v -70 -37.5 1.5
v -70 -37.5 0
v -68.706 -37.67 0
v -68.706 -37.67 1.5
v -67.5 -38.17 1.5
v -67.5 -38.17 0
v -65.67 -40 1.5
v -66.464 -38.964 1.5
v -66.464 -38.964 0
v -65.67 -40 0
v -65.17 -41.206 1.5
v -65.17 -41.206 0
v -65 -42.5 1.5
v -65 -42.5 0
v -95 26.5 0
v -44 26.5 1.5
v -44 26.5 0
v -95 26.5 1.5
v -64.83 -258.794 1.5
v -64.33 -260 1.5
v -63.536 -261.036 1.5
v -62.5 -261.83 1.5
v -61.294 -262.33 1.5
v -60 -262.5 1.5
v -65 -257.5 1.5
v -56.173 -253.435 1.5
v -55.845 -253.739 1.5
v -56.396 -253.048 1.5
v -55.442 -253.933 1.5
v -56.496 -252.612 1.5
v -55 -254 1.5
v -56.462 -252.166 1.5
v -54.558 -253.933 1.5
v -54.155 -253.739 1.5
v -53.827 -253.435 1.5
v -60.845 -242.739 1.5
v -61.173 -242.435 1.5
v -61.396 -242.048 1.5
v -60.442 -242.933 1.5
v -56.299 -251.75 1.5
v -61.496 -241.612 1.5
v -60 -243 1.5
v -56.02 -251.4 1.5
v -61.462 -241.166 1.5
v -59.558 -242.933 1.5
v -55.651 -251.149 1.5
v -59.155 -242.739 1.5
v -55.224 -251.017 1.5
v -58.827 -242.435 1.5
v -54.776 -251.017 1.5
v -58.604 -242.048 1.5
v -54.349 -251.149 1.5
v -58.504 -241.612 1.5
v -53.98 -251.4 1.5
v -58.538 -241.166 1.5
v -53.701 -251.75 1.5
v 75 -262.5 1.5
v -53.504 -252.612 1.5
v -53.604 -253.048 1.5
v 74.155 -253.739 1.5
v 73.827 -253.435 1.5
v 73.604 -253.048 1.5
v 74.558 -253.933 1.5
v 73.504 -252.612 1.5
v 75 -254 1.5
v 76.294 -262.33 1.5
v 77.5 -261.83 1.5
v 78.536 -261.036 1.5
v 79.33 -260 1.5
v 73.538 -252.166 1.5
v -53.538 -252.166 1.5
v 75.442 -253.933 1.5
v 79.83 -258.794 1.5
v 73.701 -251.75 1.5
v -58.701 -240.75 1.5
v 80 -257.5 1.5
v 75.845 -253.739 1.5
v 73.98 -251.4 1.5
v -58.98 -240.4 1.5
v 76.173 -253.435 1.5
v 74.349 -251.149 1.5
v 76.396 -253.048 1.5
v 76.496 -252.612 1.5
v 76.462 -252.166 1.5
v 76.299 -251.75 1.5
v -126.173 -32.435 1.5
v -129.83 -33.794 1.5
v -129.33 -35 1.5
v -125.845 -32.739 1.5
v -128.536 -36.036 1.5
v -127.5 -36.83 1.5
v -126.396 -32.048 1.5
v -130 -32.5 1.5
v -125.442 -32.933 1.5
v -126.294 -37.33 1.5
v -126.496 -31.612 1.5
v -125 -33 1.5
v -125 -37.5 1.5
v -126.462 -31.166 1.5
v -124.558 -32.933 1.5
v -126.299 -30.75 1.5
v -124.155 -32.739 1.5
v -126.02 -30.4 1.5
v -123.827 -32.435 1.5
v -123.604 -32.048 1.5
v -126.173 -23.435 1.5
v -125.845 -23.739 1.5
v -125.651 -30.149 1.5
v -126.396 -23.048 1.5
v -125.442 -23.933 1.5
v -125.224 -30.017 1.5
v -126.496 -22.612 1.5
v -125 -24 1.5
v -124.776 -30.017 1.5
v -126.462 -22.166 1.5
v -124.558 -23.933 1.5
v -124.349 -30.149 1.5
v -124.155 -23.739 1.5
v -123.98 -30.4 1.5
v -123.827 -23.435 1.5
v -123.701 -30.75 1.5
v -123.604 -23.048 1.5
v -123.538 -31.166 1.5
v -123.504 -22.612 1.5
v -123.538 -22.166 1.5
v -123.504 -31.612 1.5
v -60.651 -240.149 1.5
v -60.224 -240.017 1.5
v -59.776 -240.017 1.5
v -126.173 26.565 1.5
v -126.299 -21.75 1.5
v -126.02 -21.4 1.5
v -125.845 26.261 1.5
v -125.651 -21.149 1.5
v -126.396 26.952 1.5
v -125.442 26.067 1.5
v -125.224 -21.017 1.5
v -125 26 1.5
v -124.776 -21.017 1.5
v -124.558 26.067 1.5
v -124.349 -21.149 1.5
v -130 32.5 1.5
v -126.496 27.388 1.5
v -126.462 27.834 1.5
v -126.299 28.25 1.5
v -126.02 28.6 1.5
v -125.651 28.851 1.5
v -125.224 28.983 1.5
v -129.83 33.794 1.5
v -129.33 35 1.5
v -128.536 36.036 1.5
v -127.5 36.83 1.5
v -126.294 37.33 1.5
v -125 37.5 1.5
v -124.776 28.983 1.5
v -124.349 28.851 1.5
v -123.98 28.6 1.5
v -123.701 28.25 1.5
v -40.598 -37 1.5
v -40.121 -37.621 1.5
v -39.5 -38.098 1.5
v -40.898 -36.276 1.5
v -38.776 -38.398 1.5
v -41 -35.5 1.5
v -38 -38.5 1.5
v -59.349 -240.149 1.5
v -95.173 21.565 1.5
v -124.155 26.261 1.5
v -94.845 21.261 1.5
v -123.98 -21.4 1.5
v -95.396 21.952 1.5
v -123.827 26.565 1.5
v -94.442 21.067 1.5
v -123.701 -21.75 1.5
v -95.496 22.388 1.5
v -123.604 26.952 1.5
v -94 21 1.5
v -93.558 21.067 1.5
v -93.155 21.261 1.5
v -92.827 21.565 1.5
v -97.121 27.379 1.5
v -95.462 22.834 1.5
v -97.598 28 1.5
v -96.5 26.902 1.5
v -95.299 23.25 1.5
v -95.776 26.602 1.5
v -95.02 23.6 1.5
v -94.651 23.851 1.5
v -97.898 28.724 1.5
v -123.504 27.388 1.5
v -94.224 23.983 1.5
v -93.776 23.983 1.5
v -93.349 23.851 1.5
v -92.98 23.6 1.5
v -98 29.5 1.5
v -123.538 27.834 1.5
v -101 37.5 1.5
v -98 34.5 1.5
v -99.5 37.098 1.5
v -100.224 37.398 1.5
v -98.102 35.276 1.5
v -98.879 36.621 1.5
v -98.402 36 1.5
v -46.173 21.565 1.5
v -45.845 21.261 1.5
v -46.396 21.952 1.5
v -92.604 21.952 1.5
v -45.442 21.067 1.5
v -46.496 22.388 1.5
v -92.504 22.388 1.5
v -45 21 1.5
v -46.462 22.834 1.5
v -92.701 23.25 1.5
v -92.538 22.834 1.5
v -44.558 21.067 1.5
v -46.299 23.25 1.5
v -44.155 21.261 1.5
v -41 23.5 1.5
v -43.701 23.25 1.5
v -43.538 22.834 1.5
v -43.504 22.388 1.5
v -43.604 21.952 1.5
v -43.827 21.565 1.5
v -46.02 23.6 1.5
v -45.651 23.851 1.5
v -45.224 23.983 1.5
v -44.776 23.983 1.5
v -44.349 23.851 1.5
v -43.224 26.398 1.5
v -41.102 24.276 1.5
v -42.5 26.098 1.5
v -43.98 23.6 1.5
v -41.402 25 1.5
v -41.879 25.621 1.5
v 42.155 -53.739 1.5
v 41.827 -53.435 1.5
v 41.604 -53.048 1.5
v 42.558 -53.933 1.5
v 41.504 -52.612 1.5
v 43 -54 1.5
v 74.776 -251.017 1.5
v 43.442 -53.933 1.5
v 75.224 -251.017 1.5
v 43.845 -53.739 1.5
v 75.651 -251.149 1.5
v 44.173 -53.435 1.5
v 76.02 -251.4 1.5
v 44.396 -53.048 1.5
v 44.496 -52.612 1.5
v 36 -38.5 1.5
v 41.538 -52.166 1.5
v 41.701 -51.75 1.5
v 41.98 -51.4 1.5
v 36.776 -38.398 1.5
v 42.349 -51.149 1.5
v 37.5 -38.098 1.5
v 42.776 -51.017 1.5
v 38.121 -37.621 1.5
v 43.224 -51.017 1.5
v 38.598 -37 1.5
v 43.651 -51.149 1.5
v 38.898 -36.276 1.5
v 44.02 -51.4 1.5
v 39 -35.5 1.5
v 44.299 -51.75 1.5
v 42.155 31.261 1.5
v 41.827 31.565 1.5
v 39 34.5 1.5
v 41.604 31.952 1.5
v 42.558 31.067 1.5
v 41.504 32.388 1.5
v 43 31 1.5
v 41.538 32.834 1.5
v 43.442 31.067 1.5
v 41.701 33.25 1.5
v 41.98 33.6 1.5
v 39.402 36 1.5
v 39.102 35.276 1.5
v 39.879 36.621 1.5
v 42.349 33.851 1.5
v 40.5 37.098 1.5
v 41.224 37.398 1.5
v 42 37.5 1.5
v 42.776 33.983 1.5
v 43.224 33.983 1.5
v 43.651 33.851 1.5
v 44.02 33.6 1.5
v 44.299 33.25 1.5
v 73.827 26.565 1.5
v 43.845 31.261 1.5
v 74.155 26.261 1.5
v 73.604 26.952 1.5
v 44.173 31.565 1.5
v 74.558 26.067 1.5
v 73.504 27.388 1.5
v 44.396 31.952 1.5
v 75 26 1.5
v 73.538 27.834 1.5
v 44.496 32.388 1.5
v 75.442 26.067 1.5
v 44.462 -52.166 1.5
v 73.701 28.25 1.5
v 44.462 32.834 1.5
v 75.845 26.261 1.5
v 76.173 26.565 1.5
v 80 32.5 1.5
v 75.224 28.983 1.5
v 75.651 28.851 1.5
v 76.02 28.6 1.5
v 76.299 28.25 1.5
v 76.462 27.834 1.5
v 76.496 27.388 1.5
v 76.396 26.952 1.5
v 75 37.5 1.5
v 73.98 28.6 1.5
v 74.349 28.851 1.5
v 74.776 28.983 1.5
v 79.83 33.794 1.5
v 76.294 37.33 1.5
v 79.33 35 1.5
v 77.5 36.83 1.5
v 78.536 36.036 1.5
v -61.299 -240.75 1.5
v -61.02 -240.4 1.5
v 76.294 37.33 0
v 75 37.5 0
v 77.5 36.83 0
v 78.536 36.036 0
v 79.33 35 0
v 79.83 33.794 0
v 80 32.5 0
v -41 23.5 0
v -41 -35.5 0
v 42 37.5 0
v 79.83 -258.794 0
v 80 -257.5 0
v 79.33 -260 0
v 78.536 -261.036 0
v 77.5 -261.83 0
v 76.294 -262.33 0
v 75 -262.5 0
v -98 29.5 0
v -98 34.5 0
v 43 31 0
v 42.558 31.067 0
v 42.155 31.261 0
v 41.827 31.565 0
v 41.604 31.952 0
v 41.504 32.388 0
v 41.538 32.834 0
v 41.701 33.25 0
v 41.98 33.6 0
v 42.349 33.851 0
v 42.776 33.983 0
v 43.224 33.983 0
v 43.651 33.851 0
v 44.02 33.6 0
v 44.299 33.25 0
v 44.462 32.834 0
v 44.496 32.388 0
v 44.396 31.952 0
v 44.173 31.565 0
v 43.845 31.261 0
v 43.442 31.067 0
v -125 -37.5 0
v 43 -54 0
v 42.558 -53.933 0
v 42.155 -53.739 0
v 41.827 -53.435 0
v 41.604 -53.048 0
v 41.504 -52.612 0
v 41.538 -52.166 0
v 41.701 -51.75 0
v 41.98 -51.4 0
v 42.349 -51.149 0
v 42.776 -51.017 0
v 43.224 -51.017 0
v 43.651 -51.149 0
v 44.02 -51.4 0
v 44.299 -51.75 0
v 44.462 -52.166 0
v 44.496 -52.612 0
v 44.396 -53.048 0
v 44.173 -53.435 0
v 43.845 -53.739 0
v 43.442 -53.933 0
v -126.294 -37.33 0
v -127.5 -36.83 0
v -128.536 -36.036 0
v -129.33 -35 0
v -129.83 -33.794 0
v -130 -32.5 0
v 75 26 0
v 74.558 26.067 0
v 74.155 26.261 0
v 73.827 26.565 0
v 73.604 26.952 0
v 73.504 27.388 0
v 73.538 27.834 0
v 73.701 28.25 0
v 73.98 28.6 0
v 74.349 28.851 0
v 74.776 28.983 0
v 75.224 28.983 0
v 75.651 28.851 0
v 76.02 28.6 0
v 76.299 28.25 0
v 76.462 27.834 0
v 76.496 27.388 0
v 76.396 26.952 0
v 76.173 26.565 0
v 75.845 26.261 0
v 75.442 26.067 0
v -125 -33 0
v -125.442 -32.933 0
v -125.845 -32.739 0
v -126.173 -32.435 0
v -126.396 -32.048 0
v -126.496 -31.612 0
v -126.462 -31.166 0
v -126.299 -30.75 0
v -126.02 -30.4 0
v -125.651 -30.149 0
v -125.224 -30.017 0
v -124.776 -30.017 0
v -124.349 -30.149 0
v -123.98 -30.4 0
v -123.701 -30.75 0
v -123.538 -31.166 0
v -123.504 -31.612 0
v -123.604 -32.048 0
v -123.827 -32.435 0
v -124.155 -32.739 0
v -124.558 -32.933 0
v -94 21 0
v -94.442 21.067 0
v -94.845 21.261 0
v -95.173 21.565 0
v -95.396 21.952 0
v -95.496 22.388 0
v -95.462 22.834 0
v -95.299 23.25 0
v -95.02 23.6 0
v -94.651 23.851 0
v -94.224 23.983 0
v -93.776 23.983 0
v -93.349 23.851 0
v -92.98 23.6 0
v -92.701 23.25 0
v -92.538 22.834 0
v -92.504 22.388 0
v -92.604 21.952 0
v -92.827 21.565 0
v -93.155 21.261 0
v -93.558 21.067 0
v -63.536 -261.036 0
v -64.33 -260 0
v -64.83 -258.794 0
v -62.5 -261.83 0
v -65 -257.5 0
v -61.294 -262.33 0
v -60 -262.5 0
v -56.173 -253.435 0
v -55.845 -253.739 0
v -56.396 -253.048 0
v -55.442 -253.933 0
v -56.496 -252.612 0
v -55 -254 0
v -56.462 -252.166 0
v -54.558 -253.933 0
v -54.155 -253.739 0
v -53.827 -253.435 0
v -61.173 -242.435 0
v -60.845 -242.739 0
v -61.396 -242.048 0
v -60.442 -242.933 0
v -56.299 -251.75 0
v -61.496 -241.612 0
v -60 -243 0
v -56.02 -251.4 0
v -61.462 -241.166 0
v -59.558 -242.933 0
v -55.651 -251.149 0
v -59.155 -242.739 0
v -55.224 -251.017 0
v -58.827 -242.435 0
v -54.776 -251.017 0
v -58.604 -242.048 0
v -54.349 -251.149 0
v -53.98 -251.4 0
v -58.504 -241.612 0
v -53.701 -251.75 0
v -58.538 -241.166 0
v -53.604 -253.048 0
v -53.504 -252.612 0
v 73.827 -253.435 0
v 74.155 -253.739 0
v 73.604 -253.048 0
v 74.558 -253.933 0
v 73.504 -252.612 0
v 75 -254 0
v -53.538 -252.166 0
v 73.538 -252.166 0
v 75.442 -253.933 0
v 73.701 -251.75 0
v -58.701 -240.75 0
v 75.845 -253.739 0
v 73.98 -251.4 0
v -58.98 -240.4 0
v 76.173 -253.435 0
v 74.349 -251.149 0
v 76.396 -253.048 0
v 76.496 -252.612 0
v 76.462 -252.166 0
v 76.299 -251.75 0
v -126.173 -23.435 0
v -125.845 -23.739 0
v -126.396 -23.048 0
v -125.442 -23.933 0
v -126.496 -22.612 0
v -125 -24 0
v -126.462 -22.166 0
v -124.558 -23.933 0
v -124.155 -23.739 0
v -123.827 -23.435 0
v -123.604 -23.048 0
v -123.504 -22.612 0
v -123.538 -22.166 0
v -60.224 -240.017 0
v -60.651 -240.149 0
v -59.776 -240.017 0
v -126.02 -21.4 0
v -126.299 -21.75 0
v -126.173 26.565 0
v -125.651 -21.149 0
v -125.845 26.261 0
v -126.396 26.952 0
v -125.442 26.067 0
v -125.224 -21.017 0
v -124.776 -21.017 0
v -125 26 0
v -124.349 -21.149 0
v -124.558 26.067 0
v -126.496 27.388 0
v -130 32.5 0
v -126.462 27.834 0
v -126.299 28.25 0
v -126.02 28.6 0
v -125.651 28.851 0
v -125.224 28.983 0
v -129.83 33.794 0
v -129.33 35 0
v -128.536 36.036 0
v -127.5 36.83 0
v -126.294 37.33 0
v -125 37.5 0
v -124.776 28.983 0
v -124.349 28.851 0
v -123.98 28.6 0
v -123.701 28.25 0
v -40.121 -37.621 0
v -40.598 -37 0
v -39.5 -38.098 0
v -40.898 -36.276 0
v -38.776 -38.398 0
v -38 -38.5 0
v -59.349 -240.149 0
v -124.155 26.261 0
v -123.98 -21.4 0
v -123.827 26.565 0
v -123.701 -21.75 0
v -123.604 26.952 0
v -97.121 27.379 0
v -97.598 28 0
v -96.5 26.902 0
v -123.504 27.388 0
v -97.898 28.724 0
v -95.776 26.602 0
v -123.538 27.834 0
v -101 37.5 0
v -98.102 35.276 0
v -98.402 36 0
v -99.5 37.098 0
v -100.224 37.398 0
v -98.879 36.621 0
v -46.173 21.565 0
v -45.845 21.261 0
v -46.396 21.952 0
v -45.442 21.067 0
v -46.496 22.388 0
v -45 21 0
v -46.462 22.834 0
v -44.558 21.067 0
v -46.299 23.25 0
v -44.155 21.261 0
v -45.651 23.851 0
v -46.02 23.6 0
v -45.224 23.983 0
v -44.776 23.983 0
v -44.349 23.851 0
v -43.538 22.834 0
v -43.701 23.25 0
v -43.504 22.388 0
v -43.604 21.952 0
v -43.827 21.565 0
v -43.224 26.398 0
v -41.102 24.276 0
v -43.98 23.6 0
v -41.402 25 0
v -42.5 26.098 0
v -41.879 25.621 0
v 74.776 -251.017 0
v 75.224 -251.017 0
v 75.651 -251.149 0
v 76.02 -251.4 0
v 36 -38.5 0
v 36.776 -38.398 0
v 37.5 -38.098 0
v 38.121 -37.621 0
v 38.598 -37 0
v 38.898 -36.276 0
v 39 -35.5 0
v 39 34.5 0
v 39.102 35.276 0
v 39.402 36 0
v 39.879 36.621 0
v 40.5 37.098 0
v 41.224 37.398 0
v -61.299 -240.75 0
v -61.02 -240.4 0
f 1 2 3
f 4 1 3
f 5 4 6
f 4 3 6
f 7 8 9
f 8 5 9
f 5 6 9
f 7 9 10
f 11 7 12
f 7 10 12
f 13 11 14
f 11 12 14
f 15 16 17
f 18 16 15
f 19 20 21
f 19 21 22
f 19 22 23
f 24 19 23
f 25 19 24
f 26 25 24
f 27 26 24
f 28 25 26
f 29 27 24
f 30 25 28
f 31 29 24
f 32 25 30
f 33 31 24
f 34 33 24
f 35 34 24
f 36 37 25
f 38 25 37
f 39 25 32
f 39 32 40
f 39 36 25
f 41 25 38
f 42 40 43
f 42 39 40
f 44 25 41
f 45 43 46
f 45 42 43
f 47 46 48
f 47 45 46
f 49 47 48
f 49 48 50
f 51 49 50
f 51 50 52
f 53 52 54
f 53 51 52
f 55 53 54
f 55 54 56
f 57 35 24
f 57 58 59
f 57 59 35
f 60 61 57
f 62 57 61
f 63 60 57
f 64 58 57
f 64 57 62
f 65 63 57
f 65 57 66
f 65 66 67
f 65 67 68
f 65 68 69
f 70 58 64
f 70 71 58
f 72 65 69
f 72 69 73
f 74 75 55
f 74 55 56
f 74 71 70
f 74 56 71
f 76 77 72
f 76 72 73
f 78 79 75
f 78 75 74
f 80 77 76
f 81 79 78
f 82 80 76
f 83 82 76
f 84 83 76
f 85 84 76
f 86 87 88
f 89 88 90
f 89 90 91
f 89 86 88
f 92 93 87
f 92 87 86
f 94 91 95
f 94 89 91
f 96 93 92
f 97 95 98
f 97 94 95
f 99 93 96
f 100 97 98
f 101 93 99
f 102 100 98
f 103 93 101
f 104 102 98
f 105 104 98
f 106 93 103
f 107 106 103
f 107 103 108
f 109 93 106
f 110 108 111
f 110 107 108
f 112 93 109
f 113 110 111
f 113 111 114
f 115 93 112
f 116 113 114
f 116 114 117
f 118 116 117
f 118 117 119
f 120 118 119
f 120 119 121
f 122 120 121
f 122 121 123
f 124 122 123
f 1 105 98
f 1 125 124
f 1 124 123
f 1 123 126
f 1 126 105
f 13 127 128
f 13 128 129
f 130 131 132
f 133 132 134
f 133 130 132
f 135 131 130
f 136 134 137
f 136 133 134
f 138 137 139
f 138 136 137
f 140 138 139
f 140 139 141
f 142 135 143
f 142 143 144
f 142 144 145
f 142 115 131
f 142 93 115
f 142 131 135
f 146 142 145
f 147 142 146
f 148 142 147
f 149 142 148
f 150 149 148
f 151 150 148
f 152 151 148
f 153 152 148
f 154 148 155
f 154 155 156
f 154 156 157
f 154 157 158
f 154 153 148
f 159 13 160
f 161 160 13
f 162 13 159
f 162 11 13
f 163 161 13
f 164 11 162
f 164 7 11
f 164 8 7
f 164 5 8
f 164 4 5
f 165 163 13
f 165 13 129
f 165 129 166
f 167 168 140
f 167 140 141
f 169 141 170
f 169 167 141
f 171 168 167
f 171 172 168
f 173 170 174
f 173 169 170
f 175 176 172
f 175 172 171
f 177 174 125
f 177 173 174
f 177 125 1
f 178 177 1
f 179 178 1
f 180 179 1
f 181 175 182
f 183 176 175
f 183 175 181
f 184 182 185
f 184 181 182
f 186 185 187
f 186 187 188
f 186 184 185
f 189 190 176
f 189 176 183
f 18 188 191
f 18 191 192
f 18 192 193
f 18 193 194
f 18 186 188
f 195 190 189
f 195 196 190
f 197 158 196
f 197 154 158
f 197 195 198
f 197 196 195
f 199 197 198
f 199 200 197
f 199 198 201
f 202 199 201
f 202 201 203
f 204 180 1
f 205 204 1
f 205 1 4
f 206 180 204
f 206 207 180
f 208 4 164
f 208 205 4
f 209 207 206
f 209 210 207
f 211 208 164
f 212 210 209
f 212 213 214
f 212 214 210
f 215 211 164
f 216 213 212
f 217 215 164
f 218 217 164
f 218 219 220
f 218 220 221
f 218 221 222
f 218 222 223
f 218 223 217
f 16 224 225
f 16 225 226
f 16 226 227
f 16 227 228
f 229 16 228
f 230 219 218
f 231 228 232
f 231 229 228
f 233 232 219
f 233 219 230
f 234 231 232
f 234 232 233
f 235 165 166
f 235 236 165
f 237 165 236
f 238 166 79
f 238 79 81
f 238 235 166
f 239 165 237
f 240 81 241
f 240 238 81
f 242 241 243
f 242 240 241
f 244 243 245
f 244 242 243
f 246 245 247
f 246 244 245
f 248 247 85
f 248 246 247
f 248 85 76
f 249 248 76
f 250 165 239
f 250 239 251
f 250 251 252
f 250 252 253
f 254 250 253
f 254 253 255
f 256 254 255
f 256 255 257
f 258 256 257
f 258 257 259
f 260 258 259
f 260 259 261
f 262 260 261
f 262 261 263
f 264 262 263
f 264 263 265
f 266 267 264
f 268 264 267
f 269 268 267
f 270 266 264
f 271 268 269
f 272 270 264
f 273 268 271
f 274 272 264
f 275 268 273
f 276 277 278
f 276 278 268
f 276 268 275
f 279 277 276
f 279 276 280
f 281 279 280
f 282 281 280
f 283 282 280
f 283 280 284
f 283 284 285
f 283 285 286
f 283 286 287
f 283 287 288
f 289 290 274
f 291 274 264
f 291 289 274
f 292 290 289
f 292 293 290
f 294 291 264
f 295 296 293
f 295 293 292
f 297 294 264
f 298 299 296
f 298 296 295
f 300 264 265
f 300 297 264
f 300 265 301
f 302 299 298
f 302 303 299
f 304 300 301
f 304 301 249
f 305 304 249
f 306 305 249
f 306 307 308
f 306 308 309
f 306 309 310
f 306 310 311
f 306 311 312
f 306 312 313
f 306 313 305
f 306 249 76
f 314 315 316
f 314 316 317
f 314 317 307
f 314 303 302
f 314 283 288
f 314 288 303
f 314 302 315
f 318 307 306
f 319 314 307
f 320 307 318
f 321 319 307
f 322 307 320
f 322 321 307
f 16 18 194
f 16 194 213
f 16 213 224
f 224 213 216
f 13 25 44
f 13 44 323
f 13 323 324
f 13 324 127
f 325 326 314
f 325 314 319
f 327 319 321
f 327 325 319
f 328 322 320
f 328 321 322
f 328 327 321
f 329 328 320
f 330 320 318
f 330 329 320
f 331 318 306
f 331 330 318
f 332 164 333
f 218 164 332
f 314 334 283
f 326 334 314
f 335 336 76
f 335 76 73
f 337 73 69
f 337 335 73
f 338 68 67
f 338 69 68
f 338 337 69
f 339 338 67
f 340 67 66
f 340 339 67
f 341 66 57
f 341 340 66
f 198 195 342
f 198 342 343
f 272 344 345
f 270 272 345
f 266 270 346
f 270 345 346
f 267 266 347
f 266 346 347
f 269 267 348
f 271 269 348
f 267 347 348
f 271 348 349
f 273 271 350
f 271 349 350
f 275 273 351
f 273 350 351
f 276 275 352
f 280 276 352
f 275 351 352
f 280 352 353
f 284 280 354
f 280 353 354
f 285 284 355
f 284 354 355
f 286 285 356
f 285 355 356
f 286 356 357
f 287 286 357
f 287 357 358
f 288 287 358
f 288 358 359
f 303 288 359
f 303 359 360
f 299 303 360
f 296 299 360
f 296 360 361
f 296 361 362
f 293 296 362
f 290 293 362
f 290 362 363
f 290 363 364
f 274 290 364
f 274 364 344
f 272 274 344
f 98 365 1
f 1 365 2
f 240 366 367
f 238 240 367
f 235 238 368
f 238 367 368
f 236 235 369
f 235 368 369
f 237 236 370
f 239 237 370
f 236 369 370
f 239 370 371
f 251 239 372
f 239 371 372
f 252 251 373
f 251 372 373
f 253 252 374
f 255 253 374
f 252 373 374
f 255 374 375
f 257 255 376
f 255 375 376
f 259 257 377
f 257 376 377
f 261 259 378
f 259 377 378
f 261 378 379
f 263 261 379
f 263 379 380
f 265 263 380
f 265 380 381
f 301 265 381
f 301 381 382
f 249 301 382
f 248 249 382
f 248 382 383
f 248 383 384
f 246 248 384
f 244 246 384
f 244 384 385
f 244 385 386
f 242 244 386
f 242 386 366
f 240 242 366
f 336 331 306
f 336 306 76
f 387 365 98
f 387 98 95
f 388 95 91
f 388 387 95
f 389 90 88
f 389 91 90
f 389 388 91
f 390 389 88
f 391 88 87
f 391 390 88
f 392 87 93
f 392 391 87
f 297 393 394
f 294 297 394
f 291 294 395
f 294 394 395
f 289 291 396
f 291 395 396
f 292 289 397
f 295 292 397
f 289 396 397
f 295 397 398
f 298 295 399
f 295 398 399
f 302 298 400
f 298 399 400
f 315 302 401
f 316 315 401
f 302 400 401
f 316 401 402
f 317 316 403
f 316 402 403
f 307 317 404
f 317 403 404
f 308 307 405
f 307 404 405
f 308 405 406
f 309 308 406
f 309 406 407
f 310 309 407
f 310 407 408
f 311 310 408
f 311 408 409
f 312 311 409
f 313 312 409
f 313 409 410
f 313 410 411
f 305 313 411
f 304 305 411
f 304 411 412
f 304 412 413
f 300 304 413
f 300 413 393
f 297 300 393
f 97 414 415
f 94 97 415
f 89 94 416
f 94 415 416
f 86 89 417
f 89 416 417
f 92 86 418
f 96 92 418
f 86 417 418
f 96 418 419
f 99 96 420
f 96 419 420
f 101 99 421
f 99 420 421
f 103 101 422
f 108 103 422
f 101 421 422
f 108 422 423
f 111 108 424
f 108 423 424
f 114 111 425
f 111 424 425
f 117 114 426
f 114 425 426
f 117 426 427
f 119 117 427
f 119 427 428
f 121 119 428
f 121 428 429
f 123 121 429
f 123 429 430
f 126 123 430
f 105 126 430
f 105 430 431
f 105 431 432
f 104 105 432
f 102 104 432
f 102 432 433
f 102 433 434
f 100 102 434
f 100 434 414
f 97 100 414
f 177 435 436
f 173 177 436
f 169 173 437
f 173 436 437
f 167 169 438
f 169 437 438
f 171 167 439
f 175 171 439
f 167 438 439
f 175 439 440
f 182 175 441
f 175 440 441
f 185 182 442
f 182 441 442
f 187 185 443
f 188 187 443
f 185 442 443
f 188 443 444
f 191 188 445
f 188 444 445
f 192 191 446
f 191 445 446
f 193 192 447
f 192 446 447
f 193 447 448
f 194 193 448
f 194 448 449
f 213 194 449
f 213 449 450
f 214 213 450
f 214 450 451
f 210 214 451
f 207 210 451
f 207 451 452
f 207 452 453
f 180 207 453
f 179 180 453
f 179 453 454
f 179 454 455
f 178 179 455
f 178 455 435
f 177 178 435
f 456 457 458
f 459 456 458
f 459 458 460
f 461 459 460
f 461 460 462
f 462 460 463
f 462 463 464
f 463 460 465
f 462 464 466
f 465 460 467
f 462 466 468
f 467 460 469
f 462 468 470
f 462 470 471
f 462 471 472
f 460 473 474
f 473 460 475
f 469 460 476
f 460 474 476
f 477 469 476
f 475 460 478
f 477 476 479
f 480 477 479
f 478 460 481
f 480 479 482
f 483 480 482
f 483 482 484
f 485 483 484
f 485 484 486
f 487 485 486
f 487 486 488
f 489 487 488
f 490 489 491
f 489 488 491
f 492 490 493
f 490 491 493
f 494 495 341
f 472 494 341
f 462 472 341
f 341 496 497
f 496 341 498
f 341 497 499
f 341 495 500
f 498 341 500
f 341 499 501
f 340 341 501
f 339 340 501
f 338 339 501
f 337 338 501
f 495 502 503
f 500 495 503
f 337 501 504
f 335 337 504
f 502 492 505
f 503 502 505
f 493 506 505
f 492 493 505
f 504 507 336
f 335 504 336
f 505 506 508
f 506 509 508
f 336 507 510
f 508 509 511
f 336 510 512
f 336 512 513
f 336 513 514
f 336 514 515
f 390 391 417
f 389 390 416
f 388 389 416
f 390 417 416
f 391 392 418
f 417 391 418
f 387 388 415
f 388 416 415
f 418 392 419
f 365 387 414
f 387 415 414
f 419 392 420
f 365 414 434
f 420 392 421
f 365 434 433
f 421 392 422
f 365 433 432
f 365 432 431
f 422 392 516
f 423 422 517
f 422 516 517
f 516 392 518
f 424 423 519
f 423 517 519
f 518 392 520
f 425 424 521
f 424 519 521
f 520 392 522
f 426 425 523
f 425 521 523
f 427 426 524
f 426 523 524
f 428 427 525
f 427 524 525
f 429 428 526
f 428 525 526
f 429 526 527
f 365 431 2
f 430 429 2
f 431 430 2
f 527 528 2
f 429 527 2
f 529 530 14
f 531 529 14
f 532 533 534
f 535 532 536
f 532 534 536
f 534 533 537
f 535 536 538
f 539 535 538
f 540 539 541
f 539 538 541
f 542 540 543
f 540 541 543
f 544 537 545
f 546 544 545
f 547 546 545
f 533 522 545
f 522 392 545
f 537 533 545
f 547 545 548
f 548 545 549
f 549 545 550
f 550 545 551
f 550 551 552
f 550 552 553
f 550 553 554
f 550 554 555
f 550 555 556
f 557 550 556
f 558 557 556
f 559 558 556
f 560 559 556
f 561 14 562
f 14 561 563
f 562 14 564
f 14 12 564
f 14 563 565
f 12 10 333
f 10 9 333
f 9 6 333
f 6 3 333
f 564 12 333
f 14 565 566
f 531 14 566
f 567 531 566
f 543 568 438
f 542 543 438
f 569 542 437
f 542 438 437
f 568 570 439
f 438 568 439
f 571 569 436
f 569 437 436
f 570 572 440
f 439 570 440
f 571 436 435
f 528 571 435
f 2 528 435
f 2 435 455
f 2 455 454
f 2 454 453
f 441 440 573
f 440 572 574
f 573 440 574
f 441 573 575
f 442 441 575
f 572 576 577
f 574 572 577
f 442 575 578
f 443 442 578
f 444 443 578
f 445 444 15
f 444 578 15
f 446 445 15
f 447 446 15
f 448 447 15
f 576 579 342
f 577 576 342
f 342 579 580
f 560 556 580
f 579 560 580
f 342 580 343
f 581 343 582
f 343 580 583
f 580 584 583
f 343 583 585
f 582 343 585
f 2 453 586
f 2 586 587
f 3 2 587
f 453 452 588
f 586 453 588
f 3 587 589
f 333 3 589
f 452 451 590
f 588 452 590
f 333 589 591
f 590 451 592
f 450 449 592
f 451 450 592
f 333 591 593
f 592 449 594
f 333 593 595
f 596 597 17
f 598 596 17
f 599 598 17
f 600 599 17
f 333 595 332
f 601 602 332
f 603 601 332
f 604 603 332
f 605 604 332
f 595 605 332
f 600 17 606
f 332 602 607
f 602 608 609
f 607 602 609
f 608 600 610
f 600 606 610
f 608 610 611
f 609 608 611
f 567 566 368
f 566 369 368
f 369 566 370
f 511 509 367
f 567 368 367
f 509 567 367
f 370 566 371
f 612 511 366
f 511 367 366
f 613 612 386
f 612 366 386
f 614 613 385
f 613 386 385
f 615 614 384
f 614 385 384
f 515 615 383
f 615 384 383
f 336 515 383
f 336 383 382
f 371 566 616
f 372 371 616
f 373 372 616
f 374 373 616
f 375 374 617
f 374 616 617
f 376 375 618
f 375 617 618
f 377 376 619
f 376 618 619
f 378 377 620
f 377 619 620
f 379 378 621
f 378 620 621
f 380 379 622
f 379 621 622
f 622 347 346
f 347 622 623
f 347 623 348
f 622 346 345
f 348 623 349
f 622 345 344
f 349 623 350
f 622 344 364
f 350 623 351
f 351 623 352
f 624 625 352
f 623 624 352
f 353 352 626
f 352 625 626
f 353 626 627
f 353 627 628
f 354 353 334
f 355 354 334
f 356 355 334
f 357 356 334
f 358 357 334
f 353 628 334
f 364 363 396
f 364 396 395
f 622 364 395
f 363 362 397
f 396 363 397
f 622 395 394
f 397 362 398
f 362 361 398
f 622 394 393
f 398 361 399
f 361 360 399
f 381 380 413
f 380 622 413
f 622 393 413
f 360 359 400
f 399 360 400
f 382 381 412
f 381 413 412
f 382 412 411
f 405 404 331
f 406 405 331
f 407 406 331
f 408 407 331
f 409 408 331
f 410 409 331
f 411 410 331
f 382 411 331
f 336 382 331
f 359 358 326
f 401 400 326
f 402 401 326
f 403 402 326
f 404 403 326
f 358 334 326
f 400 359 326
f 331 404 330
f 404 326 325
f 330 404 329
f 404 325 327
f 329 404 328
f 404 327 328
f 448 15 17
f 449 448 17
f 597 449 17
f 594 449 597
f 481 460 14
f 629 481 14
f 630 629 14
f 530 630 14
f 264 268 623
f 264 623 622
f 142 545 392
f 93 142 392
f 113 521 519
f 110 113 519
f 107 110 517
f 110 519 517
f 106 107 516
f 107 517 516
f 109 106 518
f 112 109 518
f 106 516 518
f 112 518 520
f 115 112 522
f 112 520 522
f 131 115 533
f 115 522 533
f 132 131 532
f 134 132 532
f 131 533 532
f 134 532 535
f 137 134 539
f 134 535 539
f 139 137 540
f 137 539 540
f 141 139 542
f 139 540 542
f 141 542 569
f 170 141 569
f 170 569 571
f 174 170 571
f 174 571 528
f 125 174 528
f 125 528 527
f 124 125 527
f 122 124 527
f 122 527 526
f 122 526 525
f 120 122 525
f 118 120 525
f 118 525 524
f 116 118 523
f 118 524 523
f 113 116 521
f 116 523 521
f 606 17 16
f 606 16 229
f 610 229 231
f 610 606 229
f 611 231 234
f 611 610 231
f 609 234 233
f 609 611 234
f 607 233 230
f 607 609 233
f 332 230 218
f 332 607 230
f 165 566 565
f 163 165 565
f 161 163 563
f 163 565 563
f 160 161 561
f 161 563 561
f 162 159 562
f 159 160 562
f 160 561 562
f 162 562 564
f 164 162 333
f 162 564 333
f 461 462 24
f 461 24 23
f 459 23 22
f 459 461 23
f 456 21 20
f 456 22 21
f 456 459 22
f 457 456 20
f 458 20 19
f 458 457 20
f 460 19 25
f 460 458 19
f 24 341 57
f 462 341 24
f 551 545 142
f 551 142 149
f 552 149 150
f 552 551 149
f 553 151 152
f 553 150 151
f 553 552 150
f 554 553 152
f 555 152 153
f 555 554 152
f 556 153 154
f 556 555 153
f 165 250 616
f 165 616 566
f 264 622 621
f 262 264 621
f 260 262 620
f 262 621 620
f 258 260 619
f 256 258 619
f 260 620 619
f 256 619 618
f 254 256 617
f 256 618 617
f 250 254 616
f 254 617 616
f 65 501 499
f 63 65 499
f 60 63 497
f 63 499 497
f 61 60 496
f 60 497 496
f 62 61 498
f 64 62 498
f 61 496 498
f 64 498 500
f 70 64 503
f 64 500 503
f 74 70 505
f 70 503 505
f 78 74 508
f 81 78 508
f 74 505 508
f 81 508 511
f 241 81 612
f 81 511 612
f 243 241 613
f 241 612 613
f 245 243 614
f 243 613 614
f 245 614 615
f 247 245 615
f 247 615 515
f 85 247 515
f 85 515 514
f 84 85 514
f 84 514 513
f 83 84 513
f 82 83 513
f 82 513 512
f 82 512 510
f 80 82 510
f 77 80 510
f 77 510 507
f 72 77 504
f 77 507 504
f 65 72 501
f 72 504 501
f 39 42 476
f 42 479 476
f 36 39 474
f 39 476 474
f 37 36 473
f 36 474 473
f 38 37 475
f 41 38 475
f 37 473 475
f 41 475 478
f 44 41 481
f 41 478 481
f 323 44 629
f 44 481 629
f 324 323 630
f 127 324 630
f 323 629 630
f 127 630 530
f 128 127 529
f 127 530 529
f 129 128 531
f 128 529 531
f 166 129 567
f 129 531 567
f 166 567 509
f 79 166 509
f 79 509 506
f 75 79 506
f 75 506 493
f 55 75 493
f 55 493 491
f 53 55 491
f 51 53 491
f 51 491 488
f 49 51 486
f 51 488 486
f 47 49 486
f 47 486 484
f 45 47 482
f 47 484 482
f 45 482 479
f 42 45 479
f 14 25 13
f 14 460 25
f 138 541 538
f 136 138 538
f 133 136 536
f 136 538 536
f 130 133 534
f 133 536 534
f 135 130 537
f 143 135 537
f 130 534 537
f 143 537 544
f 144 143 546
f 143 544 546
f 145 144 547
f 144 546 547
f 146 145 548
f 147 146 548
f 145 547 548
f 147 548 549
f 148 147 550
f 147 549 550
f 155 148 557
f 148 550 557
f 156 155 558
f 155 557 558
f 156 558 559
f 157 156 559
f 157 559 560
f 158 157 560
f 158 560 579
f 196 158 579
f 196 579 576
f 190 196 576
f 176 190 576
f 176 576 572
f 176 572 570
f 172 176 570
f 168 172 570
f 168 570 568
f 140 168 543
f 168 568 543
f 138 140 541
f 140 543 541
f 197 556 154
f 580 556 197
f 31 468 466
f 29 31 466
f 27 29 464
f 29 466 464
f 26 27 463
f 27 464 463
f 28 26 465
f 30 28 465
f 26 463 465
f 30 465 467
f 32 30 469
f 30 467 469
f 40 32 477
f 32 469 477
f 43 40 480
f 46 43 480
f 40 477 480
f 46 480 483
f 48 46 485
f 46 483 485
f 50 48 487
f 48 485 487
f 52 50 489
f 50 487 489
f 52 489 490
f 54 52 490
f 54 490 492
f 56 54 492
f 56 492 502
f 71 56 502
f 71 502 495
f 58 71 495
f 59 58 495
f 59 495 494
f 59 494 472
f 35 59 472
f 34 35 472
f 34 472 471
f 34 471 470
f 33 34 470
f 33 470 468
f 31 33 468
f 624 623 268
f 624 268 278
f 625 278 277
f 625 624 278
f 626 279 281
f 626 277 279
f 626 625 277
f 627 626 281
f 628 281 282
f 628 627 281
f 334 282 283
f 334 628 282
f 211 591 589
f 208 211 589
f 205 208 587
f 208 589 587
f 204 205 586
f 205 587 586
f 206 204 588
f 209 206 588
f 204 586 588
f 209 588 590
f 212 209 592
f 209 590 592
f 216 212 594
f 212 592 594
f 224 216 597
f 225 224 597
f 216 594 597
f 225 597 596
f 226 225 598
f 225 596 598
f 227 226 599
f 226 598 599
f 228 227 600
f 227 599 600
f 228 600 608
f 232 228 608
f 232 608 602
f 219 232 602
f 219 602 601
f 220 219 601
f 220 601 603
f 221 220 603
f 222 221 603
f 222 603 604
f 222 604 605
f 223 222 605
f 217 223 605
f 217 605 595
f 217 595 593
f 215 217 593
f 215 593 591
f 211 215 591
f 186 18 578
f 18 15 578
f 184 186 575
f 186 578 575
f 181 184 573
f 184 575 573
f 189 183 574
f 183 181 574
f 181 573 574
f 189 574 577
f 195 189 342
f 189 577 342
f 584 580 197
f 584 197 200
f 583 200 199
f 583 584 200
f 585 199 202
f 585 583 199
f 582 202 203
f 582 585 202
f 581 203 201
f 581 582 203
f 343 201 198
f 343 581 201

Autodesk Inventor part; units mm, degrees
ref_plane "YZ Plane" through (0, 0, 0) normal (1, 0, 0) x (0, 1, 0)
ref_plane "XZ Plane" through (0, 0, 0) normal (0, 1, 0) x (-1, 0, 0)
ref_plane "XY Plane" through (0, 0, 0) normal (0, 0, 1) x (1, 0, 0)
sketch "スケッチ2" plane through (0, 0, 0) normal (0, 0, 1) x (1, 0, 0)
  line L0 (-75, 37.5) -> (75, 37.5)
  line L1 (80, 32.5) -> (80, -257.5)
  line L2 (75, -262.5) -> (-60, -262.5)
  line L3 (-65, -183.2657) -> (-65, -42.5)
  arc A0 (80, 32.5) -> (75, 37.5) centre (75, 32.5) ccw
  arc A1 (75, -262.5) -> (80, -257.5) centre (75, -257.5) ccw
  line L4 (-65, -257.5) -> (-65, -183.1423)
  arc A2 (-65, -257.5) -> (-60, -262.5) centre (-60, -257.5) ccw
  line L5 (-75, 37.5) -> (-125, 37.5)
  line L6 (-130, 32.5) -> (-130, -32.5)
  line L7 (-125, -37.5) -> (-70, -37.5)
  arc A3 (-125, 37.5) -> (-130, 32.5) centre (-125, 32.5) ccw
  arc A4 (-130, -32.5) -> (-125, -37.5) centre (-125, -32.5) ccw
  arc A5 (-65, -42.5) -> (-70, -37.5) centre (-70, -42.5) ccw
  point P0 (0, 0)
  point P1 (-75, 37.5)
  point P2 (80, -262.5)
  point P3 (80, 37.5)
  point P4 (-65, -262.5)
  point P5 (-75, 0)
  point P6 (0, 37.5)
  point P7 (0, 0)
  point P8 (-130, 0)
  dimension "d1" = 300
  dimension "d24" = 5
  dimension "d49" = 210
  dimension "d50" = 5
  dimension "d51" = 75
  dimension "d78" = 145
extrude "押し出し1" add sketch "スケッチ2" along normal blind 1.5
sketch "スケッチ5" plane through (0, 0, 1.5) normal (0, 0, 1) x (1, 0, 0)
  line L0 (75, 37.5) -> (-125, 37.5) projected
  line L1 (80, -257.5) -> (80, 32.5) projected
  line L2 (-60, -262.5) -> (75, -262.5) projected
  line L3 (-130, 32.5) -> (-130, -32.5) projected
  line L4 (-125, -37.5) -> (-70, -37.5) projected
  line L5 (-65, -42.5) -> (-65, -257.5) projected
  point P0 (-125, 27.5)
  point P1 (75, 27.5)
  point P2 (75, -252.5)
  point P3 (-70, 37.5)
  point P4 (-125, -31.5)
  point P5 (-60, -241.5)
  point P6 (43, -52.5)
  point P7 (43, 32.5)
  point P8 (-45, 22.5)
  point P9 (-125, -22.5)
  point P10 (-55, -252.5)
  point P11 (-94, 22.5)
  dimension "d25" = 10
  dimension "d27" = 5
  dimension "d44" = 80
  dimension "d46" = 85
  dimension "d52" = 5
  dimension "d55" = 10
  dimension "d56" = 10
  dimension "d58" = 21
  dimension "d59" = 5
  dimension "d60" = 15
  dimension "d61" = 69
  dimension "d62" = 5
  dimension "d66" = 54
  dimension "d67" = 49
  dimension "d77" = 37
hole "穴3" at (-125, 27.5, 1.5) at (75, 27.5, 1.5) at (75, -252.5, 1.5) at (-125, -31.5, 1.5) at (-60, -241.5, 1.5) at (-45, 22.5, 1.5) at (43, 32.5, 1.5) at (43, -52.5, 1.5) at (-125, -22.5, 1.5) at (-55, -252.5, 1.5) at (-94, 22.5, 1.5) direction (0, 0, -1) diameter 3 depth 8.1 tip angle 118
sketch "スケッチ6" plane through (0, 0, 1.5) normal (0, 0, 1) x (1, 0, 0)
  point P0 (0, 0)
sketch "スケッチ7" plane through (0, 0, 1.5) normal (0, 0, 1) x (1, 0, 0)
  line L0 (-41, 26.5) -> (-98, 26.5)
  line L1 (-98, 26.5) -> (-98, 37.5)
  line L2 (-98, 37.5) -> (39, 37.5)
  line L3 (39, 37.5) -> (39, -38.5)
  line L4 (-41, 0) -> (-41, 26.5)
  circle A0 centre (-45, 22.5) radius 1.5 projected
  circle A1 centre (-94, 22.5) radius 1.5 projected
  line L5 (75, 37.5) -> (-125, 37.5) projected
  line L6 (39, -38.5) -> (-41, -38.5)
  line L7 (-41, -38.5) -> (-41, 0)
  point P0 (-25.5, 0)
  dimension "d68" = 4
  dimension "d69" = 4
  dimension "d70" = 4
  dimension "d74" = 76
  dimension "d75" = 80
extrude "押し出し2" cut sketch "スケッチ7" against normal blind 10 contours L0 L1 L2 L3 L6 L7 L4
fillet "フィレット1" radius 3 6 edges at (-98, 26.5, 0.75) (-41, 26.5, 0.75) (-98, 37.5, 0.75) (-41, -38.5, 0.75) (39, -38.5, 0.75) (39, 37.5, 0.75)
properties part number "天板"
